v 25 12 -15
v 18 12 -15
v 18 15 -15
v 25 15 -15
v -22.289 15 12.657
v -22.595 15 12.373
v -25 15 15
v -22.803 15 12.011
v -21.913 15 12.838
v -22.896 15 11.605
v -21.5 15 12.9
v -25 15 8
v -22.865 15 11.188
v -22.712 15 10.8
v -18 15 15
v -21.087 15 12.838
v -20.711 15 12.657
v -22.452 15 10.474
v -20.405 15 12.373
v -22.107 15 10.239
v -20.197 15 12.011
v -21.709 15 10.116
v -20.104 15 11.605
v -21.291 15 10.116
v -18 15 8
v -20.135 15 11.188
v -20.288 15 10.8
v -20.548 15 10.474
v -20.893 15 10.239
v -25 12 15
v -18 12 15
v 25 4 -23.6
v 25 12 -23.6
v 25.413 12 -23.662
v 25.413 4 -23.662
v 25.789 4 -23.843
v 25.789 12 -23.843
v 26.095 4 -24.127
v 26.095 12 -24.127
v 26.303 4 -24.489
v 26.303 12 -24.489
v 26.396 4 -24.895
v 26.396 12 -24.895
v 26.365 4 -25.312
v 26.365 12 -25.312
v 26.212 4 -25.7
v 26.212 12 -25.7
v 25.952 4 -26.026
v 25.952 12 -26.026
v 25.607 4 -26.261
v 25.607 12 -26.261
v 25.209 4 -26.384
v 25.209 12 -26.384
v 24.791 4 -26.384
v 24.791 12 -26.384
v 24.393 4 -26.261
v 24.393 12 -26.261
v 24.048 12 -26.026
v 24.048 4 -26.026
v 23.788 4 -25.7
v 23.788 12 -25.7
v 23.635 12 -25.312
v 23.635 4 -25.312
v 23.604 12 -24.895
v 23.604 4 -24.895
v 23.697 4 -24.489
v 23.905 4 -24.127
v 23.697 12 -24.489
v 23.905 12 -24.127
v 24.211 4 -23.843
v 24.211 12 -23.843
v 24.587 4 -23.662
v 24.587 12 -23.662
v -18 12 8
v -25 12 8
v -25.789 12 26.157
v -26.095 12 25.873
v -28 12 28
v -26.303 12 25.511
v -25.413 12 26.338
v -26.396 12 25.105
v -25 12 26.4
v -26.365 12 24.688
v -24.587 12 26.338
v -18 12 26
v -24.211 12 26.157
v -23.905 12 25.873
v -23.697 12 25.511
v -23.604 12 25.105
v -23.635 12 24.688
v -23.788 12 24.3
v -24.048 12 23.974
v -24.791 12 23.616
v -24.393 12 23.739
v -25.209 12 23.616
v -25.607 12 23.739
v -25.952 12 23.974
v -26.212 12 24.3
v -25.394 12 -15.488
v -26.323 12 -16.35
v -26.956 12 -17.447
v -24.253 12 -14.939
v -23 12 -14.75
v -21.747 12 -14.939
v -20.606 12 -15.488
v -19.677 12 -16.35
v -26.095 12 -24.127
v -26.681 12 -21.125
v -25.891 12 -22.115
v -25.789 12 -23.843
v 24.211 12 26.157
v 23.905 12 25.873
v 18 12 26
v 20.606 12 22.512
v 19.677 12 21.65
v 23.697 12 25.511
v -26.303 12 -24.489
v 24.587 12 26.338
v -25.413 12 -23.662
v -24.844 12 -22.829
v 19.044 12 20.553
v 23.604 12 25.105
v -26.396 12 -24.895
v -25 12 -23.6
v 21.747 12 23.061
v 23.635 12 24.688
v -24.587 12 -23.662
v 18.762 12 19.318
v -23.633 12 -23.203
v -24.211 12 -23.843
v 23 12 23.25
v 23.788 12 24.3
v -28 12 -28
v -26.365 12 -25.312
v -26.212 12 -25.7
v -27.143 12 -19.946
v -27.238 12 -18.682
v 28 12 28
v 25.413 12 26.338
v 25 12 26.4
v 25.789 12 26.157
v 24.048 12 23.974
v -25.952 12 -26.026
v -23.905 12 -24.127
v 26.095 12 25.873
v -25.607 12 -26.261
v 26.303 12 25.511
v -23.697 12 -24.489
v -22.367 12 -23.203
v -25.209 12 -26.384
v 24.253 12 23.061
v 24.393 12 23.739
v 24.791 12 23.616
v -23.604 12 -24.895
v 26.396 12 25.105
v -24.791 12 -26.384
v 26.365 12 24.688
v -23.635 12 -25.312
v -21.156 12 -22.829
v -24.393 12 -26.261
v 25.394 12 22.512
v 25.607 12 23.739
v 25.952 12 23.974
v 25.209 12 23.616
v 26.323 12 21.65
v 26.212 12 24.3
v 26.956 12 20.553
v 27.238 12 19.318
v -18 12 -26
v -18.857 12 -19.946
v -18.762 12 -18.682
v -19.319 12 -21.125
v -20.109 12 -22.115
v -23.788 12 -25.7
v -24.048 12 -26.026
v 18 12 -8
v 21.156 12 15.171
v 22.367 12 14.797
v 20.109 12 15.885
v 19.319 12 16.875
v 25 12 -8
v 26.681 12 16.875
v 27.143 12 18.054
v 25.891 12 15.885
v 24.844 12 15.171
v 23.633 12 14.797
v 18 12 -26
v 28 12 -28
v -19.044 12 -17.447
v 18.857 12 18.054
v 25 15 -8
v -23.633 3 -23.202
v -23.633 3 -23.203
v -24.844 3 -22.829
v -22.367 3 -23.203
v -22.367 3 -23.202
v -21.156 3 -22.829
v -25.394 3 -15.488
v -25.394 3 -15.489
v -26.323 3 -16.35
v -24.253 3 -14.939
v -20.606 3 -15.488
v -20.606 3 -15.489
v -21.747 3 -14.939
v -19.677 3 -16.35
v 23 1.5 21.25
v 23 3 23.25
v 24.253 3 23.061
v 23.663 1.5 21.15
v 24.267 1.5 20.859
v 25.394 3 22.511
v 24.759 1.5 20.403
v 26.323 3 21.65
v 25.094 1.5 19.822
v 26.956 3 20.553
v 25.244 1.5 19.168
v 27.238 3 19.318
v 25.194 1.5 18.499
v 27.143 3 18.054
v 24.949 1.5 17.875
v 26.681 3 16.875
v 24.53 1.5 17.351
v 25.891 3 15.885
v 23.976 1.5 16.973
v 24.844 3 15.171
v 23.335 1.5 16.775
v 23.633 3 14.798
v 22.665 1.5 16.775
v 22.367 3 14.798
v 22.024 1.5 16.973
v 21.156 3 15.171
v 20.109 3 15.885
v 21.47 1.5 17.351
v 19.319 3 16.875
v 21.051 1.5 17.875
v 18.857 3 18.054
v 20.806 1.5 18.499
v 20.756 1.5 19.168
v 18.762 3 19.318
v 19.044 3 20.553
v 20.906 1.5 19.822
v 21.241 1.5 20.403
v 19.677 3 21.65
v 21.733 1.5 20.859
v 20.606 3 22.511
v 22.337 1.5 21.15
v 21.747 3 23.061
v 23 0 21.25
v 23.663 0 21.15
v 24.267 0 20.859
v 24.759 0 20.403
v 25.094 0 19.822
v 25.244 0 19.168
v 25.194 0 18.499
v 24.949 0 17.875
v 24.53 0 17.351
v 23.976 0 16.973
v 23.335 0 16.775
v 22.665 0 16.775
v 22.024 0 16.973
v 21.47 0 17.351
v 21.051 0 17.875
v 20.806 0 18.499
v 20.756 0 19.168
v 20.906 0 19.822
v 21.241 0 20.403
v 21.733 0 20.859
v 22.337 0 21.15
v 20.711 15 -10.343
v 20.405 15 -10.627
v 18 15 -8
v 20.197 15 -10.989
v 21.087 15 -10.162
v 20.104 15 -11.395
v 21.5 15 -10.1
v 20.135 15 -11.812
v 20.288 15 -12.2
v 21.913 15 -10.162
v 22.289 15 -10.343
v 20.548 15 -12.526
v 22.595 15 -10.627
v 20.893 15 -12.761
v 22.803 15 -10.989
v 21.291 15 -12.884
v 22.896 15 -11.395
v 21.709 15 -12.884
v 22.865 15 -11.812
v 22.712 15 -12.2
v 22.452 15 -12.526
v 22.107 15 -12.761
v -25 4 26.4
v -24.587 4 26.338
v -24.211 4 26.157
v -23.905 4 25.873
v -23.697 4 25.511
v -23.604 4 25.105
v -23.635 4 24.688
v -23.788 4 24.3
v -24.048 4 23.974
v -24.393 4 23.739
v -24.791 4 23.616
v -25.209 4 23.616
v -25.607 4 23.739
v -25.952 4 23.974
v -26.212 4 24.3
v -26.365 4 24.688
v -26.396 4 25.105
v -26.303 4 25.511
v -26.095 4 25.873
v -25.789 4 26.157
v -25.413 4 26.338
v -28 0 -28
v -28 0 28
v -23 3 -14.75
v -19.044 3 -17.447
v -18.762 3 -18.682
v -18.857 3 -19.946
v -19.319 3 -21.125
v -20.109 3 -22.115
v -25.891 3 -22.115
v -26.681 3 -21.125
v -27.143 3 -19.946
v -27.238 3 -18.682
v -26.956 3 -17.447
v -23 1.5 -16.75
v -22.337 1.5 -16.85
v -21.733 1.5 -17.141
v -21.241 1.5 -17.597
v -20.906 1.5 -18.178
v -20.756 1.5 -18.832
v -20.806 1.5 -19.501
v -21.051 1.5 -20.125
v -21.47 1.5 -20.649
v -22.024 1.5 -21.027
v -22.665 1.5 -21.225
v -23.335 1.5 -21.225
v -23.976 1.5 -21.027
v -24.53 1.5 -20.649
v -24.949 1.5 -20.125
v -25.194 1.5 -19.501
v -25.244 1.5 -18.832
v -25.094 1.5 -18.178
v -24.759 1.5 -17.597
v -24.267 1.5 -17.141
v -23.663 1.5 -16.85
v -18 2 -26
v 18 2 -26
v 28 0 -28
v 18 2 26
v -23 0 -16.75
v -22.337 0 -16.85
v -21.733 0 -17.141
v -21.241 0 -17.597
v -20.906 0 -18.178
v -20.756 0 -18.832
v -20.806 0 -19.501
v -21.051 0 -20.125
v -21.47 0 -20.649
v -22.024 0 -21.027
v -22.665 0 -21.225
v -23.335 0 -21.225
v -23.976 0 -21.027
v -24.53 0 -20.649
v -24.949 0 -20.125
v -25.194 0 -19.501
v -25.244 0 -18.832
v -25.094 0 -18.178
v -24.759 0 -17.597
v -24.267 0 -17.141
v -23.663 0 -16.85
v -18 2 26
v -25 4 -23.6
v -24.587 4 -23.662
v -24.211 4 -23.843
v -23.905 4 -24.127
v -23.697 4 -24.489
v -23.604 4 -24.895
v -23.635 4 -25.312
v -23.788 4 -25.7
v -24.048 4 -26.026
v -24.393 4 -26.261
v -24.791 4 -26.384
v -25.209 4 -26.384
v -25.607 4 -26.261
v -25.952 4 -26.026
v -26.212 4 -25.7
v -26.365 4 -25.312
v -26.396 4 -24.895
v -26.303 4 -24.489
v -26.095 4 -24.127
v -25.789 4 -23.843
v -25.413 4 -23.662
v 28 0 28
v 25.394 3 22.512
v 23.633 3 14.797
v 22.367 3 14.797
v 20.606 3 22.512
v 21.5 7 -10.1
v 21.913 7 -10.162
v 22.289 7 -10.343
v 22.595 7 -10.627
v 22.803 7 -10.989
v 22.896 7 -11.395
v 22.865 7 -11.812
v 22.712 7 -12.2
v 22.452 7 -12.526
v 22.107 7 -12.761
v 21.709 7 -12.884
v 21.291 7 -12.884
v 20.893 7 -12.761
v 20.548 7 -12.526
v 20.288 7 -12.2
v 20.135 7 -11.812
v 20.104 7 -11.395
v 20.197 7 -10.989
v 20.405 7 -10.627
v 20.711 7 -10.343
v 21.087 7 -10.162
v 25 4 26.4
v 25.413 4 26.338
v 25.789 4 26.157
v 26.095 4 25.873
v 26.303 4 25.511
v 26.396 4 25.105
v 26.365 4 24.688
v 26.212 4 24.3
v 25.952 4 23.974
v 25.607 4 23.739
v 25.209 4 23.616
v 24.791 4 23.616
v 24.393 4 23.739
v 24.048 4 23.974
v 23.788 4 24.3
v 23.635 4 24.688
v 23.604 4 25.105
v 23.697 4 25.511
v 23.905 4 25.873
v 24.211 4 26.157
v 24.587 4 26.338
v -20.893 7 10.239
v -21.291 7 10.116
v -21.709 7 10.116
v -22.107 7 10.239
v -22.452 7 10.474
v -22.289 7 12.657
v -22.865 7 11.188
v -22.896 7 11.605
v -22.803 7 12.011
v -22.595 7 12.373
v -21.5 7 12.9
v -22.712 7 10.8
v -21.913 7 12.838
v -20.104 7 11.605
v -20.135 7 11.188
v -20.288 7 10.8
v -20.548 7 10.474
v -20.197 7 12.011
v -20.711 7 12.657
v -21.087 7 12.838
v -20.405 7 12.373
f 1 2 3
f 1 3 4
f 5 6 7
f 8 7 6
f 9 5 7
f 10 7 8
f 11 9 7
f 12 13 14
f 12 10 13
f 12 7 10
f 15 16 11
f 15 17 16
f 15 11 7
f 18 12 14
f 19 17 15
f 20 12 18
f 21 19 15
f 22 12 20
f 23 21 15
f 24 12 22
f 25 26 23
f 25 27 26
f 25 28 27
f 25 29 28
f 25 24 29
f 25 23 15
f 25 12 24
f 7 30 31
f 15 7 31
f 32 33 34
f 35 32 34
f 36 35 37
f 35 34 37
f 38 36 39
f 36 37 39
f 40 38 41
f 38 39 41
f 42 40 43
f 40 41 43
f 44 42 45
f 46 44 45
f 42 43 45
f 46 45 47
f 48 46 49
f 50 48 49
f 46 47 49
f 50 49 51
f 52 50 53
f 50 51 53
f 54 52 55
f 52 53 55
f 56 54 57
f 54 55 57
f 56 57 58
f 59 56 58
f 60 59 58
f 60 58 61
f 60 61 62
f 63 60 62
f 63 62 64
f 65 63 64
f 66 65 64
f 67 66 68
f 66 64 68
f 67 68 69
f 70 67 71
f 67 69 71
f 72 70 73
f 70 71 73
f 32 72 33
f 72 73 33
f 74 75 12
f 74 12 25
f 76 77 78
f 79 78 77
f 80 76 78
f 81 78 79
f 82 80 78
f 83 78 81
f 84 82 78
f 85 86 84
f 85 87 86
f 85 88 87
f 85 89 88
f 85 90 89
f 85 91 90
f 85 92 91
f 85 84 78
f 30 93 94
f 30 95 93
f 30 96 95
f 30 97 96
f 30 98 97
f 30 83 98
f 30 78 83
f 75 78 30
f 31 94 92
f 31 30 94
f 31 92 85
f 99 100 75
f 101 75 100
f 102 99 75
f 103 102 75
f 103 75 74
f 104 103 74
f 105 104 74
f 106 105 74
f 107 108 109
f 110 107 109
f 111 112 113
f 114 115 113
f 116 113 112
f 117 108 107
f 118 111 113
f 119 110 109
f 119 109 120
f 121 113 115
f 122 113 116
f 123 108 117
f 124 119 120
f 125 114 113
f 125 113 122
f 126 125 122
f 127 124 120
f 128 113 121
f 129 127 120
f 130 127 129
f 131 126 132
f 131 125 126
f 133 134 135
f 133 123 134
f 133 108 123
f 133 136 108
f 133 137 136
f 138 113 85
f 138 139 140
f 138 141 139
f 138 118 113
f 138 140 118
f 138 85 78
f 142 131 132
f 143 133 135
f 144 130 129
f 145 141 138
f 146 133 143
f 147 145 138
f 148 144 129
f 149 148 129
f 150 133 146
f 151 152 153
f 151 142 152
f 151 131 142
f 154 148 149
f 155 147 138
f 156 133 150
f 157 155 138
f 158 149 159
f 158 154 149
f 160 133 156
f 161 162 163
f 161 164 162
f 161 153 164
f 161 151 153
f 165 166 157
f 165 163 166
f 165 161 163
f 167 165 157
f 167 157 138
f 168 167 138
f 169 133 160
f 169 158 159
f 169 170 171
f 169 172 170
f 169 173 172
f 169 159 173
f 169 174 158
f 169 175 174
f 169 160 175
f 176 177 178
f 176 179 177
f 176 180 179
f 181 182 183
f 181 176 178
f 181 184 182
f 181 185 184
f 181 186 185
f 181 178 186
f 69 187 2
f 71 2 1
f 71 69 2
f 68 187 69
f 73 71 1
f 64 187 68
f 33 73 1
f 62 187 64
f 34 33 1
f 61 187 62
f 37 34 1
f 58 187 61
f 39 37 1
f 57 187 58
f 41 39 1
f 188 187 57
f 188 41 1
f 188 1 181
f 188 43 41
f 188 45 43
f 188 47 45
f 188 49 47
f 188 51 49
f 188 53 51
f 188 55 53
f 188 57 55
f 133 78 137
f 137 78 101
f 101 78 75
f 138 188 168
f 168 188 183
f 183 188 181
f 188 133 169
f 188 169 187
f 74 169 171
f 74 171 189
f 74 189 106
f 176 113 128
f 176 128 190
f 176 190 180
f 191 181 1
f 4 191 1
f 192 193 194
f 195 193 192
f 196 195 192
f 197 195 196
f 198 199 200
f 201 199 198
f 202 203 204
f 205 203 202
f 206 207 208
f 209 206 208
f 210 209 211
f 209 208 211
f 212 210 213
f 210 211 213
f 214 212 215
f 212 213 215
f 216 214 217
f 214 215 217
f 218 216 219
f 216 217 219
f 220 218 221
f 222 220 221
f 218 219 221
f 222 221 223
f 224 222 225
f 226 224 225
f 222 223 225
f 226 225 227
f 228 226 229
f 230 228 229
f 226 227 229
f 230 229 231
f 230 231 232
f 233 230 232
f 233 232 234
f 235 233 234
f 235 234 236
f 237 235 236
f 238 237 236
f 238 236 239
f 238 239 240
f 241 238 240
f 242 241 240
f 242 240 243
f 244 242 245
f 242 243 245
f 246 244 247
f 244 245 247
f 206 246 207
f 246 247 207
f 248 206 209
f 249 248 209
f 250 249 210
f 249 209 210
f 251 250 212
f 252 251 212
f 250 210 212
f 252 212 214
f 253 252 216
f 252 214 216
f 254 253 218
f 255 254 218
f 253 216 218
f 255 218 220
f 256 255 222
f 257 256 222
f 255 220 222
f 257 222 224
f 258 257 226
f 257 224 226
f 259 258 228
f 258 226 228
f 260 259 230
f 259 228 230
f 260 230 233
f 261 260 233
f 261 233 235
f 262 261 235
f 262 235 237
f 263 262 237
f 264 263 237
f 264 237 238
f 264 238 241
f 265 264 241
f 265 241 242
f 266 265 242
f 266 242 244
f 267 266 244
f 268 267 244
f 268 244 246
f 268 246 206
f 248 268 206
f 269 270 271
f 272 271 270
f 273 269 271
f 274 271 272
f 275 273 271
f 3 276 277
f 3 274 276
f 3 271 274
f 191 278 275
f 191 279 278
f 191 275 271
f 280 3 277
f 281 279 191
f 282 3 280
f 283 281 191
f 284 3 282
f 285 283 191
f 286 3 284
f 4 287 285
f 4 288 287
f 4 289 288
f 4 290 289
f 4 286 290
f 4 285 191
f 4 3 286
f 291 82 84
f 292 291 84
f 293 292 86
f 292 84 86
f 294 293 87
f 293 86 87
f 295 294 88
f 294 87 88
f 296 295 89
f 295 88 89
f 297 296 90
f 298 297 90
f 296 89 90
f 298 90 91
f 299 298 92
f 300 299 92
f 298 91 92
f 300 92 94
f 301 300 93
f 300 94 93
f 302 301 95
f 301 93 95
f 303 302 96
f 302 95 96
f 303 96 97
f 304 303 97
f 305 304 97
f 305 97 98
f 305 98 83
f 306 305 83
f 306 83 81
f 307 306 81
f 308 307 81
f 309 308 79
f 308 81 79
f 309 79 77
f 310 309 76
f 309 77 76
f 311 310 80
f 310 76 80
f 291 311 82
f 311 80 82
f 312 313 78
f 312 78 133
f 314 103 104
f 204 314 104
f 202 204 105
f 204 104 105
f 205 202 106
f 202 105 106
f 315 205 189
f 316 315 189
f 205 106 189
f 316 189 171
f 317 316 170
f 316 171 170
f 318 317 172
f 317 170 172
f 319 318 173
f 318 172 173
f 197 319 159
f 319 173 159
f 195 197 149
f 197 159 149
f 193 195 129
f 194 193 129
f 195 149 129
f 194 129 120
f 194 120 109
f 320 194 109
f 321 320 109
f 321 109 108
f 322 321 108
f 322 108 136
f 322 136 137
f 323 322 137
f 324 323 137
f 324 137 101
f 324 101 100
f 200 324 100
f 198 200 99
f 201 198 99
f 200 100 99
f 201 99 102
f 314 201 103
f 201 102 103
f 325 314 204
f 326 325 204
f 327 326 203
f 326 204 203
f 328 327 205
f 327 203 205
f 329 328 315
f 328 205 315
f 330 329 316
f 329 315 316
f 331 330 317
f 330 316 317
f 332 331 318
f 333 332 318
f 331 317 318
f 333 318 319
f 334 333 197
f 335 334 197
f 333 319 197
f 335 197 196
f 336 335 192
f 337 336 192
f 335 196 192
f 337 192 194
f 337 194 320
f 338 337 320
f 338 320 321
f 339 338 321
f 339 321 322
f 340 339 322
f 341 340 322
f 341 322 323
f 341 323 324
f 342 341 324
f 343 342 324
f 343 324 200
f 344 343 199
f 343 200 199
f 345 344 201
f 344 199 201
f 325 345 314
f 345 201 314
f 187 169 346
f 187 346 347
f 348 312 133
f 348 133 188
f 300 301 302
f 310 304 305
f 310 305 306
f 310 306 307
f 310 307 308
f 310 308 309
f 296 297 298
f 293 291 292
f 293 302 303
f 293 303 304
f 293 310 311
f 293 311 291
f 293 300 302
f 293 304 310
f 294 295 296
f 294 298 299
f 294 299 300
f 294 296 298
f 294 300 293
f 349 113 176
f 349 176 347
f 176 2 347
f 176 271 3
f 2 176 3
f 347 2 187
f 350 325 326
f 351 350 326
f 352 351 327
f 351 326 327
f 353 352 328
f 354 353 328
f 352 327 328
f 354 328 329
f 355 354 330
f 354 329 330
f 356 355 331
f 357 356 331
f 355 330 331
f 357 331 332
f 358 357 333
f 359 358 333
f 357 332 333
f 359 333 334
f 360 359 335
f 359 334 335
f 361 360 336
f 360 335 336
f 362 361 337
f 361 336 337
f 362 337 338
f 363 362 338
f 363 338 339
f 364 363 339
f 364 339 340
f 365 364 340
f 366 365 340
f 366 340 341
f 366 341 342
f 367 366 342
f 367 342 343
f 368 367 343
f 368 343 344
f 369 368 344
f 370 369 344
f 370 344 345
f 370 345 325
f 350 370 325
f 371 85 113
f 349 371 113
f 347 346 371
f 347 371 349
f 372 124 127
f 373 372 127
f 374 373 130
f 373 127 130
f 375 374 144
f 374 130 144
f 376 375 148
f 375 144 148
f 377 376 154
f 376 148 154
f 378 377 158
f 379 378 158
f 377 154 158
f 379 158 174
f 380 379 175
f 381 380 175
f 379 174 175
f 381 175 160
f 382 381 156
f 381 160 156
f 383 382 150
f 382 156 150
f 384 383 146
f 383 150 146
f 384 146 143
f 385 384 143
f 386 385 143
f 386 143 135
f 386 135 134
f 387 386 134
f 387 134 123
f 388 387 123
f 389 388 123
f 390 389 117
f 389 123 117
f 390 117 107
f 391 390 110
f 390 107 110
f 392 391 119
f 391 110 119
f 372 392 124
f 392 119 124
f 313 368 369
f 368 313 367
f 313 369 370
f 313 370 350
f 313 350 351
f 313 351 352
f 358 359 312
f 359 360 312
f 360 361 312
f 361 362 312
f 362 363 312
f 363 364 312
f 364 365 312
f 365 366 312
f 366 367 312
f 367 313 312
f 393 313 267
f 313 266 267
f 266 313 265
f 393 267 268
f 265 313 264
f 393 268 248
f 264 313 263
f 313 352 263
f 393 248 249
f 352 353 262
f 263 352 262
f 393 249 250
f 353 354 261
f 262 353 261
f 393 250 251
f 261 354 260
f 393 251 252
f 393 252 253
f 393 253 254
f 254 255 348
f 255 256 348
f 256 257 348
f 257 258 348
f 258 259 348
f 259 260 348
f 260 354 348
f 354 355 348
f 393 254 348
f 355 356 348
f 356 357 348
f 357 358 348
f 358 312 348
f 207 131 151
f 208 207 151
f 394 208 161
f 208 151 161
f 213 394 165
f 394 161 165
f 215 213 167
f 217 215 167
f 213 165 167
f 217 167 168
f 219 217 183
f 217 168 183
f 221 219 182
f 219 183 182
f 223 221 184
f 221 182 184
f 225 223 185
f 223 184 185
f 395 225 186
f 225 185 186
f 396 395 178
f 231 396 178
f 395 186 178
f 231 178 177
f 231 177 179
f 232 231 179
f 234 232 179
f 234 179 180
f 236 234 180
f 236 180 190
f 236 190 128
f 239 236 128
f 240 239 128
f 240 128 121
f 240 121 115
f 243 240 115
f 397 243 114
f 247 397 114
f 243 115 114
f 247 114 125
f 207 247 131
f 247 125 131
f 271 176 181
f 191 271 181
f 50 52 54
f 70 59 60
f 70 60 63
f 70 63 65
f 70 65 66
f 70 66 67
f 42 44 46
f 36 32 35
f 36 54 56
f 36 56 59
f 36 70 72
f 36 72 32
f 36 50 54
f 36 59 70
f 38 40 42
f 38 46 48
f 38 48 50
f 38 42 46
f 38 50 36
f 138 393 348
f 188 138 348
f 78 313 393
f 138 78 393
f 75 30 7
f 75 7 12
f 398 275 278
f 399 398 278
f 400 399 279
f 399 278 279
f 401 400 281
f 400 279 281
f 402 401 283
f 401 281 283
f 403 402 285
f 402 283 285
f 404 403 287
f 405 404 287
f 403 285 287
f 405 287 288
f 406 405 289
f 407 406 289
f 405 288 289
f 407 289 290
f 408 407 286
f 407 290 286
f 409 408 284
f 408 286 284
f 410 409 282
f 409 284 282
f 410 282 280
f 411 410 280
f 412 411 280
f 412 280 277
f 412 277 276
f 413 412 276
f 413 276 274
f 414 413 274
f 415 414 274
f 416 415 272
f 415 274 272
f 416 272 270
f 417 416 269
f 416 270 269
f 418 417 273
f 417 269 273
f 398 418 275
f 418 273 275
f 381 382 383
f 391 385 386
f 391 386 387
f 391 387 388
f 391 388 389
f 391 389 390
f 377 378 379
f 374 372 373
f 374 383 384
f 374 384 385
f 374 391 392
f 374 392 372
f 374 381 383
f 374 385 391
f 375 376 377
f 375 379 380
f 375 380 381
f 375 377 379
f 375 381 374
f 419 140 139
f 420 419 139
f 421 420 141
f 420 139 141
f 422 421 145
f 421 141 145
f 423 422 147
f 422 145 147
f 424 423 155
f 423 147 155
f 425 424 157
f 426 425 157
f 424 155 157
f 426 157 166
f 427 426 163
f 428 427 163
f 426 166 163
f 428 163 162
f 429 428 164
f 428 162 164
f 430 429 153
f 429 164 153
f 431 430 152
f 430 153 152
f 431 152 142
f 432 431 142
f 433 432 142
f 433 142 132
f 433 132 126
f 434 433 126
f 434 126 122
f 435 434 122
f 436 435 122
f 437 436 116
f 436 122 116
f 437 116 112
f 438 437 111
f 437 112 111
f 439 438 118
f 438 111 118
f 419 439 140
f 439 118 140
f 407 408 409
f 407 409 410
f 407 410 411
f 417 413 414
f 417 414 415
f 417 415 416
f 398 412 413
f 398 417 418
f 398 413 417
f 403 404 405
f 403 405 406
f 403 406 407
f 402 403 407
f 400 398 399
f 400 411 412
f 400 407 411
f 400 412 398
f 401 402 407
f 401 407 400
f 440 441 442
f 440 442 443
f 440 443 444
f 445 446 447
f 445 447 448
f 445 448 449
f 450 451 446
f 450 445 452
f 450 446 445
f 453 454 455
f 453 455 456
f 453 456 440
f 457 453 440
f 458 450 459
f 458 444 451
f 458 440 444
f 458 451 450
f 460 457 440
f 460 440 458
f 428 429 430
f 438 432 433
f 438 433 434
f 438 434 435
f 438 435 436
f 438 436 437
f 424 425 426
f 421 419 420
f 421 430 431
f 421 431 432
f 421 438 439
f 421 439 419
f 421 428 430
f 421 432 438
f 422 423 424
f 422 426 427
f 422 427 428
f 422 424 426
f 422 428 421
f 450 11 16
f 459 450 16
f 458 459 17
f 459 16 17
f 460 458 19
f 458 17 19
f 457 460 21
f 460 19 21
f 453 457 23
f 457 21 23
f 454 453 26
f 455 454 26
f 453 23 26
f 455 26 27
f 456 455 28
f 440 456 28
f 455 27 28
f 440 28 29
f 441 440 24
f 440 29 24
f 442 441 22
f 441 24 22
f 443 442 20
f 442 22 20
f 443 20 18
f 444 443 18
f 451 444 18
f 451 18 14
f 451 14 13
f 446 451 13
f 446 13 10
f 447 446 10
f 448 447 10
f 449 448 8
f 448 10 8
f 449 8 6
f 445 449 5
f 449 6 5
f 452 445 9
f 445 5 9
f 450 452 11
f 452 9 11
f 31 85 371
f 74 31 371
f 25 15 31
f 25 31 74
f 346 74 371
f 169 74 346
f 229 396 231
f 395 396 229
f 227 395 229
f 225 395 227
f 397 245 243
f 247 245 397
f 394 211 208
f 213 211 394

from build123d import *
from OCP.BRepFilletAPI import BRepFilletAPI_MakeChamfer

# Parameters (mm, degrees)
SKETCH_1_W          = 56
SKETCH_1_H          = 56
EXTRUDE_1_DEPTH     = 12
SKETCH_2_W          = 36
SKETCH_2_H          = 52
CUT_EXTRUDE_1_DEPTH = 10
SKETCH_4_W          = 7
SKETCH_4_H          = 7
EXTRUDE_3_DEPTH     = 3
SKETCH_5_R          = 1.4
CUT_EXTRUDE_3_DEPTH = 8
SKETCH_6_R          = 2.25
CUT_EXTRUDE_4_DEPTH = 42.376321731
SKETCH_7_R          = 4.25
CUT_EXTRUDE_5_DEPTH = 9
CHAMFER_1_SIZE      = 1.5
CHAMFER_1_SIZE_2    = 2
SKETCH_8_R          = 1.4
CUT_EXTRUDE_6_DEPTH = 8


with BuildPart() as part:
    # Эскиз1 → Бобышка-Вытянуть1 (new body)
    with BuildSketch(Plane(origin=(0, 0, 0), x_dir=(1, 0, 0), z_dir=(0, 1, 0))):
        Rectangle(SKETCH_1_W, SKETCH_1_H)
    extrude(amount=EXTRUDE_1_DEPTH)

    # Эскиз2 → Вырез-Вытянуть1 (cut)
    with BuildSketch(Plane(origin=(0, 12, 0), x_dir=(1, 0, 0), z_dir=(0, 1, 0))):
        Rectangle(SKETCH_2_W, SKETCH_2_H)
    extrude(amount=-CUT_EXTRUDE_1_DEPTH, mode=Mode.SUBTRACT)

    # Эскиз4 → Бобышка-Вытянуть3 (add)
    with BuildSketch(Plane(origin=(0, 12, 0), x_dir=(1, 0, 0), z_dir=(0, 1, 0))):
        with Locations((-21.5, -11.5)):
            Rectangle(SKETCH_4_W, SKETCH_4_H)
        with Locations((21.5, 11.5)):
            Rectangle(SKETCH_4_W, SKETCH_4_H)
    extrude(amount=EXTRUDE_3_DEPTH)

    # Эскиз5 → Вырез-Вытянуть3 (cut)
    with BuildSketch(Plane(origin=(0, 15, 0), x_dir=(1, 0, 0), z_dir=(0, 1, 0))):
        with Locations(Location((-21.5, -11.5, 0), (0, 0, 270))):
            Circle(SKETCH_5_R)
        with Locations(Location((21.5, 11.5, 0), (0, 0, 270))):
            Circle(SKETCH_5_R)
    extrude(amount=-CUT_EXTRUDE_3_DEPTH, mode=Mode.SUBTRACT)

    # Эскиз6 → Вырез-Вытянуть4 (cut, through all)
    with BuildSketch(Plane(origin=(0, 12, 0), x_dir=(1, 0, 0), z_dir=(0, 1, 0))):
        with Locations(Location((-23, 19, 0), (0, 0, 270))):
            Circle(SKETCH_6_R)
        with Locations(Location((23, -19, 0), (0, 0, 270))):
            Circle(SKETCH_6_R)
    extrude(amount=-CUT_EXTRUDE_4_DEPTH, mode=Mode.SUBTRACT)

    # Эскиз7 → Вырез-Вытянуть5 (cut)
    with BuildSketch(Plane(origin=(0, 12, 0), x_dir=(1, 0, 0), z_dir=(0, 1, 0))):
        with Locations(Location((-23, 19, 0), (0, 0, 270))):
            Circle(SKETCH_7_R)
        with Locations(Location((23, -19, 0), (0, 0, 270))):
            Circle(SKETCH_7_R)
    extrude(amount=-CUT_EXTRUDE_5_DEPTH, mode=Mode.SUBTRACT)

    # Фаска1
    chamfer_1_edges_1 = [part.edges().sort_by_distance(p)[0] for p in [
        (-23, 3, -21.25),
    ]]
    chamfer_1_side_1 = [part.faces().sort_by_distance(p)[0] for p in [
        (-23, 2.97, -21.25),
    ]]
    chamfer_1_edges_2 = [part.edges().sort_by_distance(p)[0] for p in [
        (23, 3, 16.75),
    ]]
    chamfer_1_side_2 = [part.faces().sort_by_distance(p)[0] for p in [
        (23, 2.97, 16.75),
    ]]
    chamfer_1 = BRepFilletAPI_MakeChamfer(part.part.solid().wrapped)
    for e in chamfer_1_edges_1:
        chamfer_1.Add(CHAMFER_1_SIZE - 0.0001, CHAMFER_1_SIZE_2 - 0.0001, e.wrapped, chamfer_1_side_1[0].wrapped)
    for e in chamfer_1_edges_2:
        chamfer_1.Add(CHAMFER_1_SIZE - 0.0001, CHAMFER_1_SIZE_2 - 0.0001, e.wrapped, chamfer_1_side_2[0].wrapped)
    add(Compound.cast(chamfer_1.Shape()), mode=Mode.REPLACE)  # a hair under: the kernel refuses the full size

    # Эскиз8 → Вырез-Вытянуть6 (cut)
    with BuildSketch(Plane(origin=(0, 12, 0), x_dir=(1, 0, 0), z_dir=(0, 1, 0))):
        with Locations(Location((-25, 25, 0), (0, 0, 270))):
            Circle(SKETCH_8_R)
        with Locations(Location((25, -25, 0), (0, 0, 270))):
            Circle(SKETCH_8_R)
        with Locations(Location((-25, -25, 0), (0, 0, 270))):
            Circle(SKETCH_8_R)
        with Locations(Location((25, 25, 0), (0, 0, 270))):
            Circle(SKETCH_8_R)
    extrude(amount=-CUT_EXTRUDE_6_DEPTH, mode=Mode.SUBTRACT)


solid = part.part
